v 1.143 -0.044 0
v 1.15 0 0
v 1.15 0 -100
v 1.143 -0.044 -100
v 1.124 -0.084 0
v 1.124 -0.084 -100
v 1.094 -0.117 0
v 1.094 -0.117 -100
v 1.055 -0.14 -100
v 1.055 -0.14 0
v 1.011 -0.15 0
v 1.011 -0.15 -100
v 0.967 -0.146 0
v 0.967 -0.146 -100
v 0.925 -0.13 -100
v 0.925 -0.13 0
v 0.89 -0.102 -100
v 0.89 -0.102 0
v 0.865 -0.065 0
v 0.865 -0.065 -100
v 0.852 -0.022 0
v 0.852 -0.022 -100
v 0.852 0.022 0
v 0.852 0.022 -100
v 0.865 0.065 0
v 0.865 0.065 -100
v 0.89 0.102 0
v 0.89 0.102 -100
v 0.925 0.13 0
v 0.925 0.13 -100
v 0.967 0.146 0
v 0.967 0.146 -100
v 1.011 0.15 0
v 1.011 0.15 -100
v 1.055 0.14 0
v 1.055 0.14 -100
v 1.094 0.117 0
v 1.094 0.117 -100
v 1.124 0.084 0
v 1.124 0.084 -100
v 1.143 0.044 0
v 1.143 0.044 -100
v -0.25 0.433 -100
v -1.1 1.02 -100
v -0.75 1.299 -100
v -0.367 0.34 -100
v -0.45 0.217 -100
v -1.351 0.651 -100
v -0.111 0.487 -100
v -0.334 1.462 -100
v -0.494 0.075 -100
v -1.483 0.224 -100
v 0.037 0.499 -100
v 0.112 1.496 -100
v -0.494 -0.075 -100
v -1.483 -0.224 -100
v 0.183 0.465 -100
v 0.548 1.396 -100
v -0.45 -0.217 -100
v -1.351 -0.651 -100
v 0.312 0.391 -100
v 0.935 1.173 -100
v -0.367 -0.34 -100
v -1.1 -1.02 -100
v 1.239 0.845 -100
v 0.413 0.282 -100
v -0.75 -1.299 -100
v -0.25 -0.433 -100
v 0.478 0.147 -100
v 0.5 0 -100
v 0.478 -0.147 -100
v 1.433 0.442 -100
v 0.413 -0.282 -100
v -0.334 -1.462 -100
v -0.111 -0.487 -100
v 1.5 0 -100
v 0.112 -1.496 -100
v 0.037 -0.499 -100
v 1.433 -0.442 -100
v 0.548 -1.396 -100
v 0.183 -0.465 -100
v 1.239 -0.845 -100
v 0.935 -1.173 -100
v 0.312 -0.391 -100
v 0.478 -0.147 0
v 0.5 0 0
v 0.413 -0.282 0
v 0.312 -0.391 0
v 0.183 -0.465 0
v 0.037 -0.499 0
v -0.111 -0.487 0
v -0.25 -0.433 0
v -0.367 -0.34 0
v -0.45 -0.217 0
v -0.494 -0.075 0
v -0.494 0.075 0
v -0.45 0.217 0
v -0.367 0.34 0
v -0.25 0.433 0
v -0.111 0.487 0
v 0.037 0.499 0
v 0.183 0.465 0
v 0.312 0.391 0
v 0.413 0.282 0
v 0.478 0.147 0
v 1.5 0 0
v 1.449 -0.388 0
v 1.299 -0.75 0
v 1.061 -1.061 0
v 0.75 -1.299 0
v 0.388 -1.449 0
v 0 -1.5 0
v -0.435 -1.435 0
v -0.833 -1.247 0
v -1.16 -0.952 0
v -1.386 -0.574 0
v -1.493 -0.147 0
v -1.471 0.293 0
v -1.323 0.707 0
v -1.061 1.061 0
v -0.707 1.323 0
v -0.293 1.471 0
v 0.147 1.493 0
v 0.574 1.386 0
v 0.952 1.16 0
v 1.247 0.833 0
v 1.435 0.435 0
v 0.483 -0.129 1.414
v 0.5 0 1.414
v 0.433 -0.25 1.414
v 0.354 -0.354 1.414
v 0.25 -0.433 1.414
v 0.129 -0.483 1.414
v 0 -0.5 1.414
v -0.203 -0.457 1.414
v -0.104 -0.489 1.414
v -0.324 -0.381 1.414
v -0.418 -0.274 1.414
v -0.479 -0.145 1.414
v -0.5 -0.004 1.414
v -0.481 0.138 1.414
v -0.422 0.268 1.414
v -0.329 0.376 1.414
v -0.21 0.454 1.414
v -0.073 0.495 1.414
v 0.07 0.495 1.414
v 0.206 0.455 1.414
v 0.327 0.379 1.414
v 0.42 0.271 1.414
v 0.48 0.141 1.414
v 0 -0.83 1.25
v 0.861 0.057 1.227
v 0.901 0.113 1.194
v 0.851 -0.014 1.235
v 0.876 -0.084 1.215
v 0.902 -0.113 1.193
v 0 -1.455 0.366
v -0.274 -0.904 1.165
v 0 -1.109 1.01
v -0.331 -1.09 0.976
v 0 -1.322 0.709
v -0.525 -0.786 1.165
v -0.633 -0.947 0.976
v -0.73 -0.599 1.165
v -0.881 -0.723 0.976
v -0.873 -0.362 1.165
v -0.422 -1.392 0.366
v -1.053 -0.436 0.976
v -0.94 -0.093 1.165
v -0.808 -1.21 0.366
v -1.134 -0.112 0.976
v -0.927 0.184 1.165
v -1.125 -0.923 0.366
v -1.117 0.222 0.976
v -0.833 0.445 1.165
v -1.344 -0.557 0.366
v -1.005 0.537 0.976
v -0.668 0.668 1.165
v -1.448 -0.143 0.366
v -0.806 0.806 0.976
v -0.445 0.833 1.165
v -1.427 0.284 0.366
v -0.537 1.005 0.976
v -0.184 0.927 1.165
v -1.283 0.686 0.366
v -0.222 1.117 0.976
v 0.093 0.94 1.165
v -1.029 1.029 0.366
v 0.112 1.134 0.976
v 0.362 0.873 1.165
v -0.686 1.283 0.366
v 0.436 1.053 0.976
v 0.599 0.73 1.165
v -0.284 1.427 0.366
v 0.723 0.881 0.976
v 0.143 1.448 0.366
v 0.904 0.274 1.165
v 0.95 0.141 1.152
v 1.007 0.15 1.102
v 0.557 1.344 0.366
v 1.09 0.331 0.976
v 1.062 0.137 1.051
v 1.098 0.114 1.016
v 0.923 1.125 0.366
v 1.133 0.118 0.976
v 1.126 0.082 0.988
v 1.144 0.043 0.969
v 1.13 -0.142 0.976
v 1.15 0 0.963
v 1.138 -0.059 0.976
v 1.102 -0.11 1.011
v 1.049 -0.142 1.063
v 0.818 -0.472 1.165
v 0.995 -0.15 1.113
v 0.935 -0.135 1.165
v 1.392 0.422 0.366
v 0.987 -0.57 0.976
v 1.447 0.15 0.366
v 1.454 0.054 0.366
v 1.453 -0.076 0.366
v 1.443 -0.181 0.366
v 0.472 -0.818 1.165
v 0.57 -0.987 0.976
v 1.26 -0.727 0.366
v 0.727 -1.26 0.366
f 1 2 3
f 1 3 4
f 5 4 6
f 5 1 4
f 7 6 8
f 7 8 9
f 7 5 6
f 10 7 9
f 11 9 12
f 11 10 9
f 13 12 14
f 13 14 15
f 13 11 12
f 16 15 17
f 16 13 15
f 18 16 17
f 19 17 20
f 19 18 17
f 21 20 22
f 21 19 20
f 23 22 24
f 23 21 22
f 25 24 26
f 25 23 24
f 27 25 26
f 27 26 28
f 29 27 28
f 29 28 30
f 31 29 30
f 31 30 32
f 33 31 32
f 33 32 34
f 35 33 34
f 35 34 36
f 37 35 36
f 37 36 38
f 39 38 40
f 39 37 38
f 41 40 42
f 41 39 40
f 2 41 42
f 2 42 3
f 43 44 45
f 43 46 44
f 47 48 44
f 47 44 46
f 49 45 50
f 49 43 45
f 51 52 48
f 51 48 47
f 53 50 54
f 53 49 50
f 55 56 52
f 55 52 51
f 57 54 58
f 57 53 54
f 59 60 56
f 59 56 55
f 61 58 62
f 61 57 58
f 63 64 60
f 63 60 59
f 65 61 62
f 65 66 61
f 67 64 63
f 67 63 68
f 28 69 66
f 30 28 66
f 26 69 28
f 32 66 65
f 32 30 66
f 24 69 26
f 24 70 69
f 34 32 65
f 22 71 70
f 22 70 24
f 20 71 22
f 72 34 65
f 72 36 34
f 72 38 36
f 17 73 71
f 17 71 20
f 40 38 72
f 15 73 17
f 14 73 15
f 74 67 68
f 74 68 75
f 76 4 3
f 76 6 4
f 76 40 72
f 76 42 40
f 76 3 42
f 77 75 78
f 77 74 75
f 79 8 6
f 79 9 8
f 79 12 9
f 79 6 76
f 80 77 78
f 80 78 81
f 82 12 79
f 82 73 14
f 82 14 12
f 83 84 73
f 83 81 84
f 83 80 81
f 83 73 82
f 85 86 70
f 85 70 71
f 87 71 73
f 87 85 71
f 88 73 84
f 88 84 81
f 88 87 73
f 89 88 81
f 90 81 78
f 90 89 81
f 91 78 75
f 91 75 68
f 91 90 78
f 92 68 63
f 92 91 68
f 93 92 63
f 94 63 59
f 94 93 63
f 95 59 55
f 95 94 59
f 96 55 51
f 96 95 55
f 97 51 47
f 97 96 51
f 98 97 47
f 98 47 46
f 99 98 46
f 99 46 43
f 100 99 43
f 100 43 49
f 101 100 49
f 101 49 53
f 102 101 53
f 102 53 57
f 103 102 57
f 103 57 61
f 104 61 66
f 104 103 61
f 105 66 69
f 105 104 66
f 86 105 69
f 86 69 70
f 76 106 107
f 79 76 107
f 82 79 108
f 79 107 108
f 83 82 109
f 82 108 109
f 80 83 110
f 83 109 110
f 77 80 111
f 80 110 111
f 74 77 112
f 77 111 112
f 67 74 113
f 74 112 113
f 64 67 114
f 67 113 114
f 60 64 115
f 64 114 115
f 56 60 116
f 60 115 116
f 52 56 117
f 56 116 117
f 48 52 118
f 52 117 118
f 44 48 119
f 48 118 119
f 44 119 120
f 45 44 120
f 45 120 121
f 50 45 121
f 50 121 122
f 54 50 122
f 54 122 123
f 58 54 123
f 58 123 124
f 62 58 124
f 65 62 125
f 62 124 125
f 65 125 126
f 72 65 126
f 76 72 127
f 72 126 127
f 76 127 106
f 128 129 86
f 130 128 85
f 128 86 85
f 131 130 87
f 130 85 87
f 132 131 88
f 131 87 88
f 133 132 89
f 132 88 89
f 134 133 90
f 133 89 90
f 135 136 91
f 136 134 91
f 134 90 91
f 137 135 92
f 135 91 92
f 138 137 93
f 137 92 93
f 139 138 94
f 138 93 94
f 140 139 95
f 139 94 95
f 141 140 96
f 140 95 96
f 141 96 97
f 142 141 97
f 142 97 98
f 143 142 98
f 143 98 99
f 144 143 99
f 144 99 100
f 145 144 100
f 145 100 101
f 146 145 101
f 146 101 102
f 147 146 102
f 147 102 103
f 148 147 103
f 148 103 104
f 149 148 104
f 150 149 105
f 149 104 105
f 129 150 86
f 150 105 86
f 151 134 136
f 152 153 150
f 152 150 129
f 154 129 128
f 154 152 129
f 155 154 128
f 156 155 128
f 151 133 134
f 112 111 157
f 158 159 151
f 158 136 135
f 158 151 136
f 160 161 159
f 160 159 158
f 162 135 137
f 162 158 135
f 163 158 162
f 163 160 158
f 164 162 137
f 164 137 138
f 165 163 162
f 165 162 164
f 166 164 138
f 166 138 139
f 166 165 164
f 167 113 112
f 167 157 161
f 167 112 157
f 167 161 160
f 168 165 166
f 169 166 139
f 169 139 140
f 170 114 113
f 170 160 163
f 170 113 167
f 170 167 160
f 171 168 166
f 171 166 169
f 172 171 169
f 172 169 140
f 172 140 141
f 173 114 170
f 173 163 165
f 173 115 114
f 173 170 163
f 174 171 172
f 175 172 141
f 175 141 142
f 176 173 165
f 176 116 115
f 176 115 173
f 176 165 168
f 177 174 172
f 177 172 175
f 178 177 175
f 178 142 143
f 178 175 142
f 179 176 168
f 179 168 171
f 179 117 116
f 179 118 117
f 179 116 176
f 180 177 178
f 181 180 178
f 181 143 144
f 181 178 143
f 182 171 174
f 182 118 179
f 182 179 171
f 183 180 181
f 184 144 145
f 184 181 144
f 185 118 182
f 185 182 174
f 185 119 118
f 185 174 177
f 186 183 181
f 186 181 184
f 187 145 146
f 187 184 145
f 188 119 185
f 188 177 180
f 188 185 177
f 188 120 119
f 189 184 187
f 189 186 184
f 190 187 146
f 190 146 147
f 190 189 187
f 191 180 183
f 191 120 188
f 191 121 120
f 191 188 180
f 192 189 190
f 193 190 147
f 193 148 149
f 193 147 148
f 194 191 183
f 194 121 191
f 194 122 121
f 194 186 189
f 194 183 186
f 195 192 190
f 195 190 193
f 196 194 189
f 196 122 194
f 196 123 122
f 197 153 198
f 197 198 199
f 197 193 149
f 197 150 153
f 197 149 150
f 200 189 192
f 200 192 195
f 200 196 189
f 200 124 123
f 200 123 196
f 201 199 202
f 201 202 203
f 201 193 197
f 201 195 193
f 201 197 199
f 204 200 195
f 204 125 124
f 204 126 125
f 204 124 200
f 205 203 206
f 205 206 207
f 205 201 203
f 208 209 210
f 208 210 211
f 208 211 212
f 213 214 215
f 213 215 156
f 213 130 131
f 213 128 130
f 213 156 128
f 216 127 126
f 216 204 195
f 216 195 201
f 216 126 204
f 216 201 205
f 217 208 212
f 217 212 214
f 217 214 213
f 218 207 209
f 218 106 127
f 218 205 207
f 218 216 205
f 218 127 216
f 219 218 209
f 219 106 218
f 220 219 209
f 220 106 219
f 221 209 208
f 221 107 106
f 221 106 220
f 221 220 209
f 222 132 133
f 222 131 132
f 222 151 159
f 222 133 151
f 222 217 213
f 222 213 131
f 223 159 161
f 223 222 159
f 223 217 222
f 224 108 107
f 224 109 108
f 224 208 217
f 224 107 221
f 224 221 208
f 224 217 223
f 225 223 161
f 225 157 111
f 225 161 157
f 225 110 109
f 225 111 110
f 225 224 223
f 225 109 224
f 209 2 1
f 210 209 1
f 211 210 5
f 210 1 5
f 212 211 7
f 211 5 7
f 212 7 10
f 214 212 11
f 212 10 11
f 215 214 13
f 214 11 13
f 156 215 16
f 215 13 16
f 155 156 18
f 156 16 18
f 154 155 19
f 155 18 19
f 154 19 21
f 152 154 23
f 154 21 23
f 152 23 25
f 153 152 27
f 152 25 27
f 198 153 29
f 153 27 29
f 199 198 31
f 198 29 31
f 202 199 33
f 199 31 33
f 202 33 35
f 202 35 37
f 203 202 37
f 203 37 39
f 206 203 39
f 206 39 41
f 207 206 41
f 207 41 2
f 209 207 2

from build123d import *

# Parameters (mm, degrees)
F2_R        = 0.5
F2_R_2      = 0.15
F3_DEPTH    = 25.4
F1_FACE_R   = 1.5
F1_FACE_R_2 = 0.15
F1_FACE_R_3 = 0.5
F4_DEPTH    = 100


with BuildPart() as f1:
    # F0 (on Right) → F1 (revolve)
    with BuildSketch(Plane.YZ):
        with BuildLine():
            Line((0, 0), (0, 1.5))
            ThreePointArc((0, 1.5), (-1.06066, 1.06066), (-1.5, 0))
            Line((-1.5, 0), (0, 0))
        make_face()
    revolve(axis=Axis((0, 0, 0.75), (0, 0, -1)))

    # F2 (on face) → F3 (cut)
    with BuildSketch(Plane(origin=(0, 0, 0), x_dir=(1, 0, 0), z_dir=(0, 0, -1))):
        Circle(F2_R)
        with Locations((1, 0)):
            Circle(F2_R_2)
    extrude(amount=-F3_DEPTH, mode=Mode.SUBTRACT)

    # F1_face (on face) → F4 (join)
    with BuildSketch(Plane(origin=(0, 0, 0), x_dir=(1, 0, 0), z_dir=(0, 0, -1))):
        Circle(F1_FACE_R)
        with Locations((1, 0)):
            Circle(F1_FACE_R_2, mode=Mode.SUBTRACT)
        Circle(F1_FACE_R_3, mode=Mode.SUBTRACT)
    extrude(amount=F4_DEPTH)


solid = f1.part
